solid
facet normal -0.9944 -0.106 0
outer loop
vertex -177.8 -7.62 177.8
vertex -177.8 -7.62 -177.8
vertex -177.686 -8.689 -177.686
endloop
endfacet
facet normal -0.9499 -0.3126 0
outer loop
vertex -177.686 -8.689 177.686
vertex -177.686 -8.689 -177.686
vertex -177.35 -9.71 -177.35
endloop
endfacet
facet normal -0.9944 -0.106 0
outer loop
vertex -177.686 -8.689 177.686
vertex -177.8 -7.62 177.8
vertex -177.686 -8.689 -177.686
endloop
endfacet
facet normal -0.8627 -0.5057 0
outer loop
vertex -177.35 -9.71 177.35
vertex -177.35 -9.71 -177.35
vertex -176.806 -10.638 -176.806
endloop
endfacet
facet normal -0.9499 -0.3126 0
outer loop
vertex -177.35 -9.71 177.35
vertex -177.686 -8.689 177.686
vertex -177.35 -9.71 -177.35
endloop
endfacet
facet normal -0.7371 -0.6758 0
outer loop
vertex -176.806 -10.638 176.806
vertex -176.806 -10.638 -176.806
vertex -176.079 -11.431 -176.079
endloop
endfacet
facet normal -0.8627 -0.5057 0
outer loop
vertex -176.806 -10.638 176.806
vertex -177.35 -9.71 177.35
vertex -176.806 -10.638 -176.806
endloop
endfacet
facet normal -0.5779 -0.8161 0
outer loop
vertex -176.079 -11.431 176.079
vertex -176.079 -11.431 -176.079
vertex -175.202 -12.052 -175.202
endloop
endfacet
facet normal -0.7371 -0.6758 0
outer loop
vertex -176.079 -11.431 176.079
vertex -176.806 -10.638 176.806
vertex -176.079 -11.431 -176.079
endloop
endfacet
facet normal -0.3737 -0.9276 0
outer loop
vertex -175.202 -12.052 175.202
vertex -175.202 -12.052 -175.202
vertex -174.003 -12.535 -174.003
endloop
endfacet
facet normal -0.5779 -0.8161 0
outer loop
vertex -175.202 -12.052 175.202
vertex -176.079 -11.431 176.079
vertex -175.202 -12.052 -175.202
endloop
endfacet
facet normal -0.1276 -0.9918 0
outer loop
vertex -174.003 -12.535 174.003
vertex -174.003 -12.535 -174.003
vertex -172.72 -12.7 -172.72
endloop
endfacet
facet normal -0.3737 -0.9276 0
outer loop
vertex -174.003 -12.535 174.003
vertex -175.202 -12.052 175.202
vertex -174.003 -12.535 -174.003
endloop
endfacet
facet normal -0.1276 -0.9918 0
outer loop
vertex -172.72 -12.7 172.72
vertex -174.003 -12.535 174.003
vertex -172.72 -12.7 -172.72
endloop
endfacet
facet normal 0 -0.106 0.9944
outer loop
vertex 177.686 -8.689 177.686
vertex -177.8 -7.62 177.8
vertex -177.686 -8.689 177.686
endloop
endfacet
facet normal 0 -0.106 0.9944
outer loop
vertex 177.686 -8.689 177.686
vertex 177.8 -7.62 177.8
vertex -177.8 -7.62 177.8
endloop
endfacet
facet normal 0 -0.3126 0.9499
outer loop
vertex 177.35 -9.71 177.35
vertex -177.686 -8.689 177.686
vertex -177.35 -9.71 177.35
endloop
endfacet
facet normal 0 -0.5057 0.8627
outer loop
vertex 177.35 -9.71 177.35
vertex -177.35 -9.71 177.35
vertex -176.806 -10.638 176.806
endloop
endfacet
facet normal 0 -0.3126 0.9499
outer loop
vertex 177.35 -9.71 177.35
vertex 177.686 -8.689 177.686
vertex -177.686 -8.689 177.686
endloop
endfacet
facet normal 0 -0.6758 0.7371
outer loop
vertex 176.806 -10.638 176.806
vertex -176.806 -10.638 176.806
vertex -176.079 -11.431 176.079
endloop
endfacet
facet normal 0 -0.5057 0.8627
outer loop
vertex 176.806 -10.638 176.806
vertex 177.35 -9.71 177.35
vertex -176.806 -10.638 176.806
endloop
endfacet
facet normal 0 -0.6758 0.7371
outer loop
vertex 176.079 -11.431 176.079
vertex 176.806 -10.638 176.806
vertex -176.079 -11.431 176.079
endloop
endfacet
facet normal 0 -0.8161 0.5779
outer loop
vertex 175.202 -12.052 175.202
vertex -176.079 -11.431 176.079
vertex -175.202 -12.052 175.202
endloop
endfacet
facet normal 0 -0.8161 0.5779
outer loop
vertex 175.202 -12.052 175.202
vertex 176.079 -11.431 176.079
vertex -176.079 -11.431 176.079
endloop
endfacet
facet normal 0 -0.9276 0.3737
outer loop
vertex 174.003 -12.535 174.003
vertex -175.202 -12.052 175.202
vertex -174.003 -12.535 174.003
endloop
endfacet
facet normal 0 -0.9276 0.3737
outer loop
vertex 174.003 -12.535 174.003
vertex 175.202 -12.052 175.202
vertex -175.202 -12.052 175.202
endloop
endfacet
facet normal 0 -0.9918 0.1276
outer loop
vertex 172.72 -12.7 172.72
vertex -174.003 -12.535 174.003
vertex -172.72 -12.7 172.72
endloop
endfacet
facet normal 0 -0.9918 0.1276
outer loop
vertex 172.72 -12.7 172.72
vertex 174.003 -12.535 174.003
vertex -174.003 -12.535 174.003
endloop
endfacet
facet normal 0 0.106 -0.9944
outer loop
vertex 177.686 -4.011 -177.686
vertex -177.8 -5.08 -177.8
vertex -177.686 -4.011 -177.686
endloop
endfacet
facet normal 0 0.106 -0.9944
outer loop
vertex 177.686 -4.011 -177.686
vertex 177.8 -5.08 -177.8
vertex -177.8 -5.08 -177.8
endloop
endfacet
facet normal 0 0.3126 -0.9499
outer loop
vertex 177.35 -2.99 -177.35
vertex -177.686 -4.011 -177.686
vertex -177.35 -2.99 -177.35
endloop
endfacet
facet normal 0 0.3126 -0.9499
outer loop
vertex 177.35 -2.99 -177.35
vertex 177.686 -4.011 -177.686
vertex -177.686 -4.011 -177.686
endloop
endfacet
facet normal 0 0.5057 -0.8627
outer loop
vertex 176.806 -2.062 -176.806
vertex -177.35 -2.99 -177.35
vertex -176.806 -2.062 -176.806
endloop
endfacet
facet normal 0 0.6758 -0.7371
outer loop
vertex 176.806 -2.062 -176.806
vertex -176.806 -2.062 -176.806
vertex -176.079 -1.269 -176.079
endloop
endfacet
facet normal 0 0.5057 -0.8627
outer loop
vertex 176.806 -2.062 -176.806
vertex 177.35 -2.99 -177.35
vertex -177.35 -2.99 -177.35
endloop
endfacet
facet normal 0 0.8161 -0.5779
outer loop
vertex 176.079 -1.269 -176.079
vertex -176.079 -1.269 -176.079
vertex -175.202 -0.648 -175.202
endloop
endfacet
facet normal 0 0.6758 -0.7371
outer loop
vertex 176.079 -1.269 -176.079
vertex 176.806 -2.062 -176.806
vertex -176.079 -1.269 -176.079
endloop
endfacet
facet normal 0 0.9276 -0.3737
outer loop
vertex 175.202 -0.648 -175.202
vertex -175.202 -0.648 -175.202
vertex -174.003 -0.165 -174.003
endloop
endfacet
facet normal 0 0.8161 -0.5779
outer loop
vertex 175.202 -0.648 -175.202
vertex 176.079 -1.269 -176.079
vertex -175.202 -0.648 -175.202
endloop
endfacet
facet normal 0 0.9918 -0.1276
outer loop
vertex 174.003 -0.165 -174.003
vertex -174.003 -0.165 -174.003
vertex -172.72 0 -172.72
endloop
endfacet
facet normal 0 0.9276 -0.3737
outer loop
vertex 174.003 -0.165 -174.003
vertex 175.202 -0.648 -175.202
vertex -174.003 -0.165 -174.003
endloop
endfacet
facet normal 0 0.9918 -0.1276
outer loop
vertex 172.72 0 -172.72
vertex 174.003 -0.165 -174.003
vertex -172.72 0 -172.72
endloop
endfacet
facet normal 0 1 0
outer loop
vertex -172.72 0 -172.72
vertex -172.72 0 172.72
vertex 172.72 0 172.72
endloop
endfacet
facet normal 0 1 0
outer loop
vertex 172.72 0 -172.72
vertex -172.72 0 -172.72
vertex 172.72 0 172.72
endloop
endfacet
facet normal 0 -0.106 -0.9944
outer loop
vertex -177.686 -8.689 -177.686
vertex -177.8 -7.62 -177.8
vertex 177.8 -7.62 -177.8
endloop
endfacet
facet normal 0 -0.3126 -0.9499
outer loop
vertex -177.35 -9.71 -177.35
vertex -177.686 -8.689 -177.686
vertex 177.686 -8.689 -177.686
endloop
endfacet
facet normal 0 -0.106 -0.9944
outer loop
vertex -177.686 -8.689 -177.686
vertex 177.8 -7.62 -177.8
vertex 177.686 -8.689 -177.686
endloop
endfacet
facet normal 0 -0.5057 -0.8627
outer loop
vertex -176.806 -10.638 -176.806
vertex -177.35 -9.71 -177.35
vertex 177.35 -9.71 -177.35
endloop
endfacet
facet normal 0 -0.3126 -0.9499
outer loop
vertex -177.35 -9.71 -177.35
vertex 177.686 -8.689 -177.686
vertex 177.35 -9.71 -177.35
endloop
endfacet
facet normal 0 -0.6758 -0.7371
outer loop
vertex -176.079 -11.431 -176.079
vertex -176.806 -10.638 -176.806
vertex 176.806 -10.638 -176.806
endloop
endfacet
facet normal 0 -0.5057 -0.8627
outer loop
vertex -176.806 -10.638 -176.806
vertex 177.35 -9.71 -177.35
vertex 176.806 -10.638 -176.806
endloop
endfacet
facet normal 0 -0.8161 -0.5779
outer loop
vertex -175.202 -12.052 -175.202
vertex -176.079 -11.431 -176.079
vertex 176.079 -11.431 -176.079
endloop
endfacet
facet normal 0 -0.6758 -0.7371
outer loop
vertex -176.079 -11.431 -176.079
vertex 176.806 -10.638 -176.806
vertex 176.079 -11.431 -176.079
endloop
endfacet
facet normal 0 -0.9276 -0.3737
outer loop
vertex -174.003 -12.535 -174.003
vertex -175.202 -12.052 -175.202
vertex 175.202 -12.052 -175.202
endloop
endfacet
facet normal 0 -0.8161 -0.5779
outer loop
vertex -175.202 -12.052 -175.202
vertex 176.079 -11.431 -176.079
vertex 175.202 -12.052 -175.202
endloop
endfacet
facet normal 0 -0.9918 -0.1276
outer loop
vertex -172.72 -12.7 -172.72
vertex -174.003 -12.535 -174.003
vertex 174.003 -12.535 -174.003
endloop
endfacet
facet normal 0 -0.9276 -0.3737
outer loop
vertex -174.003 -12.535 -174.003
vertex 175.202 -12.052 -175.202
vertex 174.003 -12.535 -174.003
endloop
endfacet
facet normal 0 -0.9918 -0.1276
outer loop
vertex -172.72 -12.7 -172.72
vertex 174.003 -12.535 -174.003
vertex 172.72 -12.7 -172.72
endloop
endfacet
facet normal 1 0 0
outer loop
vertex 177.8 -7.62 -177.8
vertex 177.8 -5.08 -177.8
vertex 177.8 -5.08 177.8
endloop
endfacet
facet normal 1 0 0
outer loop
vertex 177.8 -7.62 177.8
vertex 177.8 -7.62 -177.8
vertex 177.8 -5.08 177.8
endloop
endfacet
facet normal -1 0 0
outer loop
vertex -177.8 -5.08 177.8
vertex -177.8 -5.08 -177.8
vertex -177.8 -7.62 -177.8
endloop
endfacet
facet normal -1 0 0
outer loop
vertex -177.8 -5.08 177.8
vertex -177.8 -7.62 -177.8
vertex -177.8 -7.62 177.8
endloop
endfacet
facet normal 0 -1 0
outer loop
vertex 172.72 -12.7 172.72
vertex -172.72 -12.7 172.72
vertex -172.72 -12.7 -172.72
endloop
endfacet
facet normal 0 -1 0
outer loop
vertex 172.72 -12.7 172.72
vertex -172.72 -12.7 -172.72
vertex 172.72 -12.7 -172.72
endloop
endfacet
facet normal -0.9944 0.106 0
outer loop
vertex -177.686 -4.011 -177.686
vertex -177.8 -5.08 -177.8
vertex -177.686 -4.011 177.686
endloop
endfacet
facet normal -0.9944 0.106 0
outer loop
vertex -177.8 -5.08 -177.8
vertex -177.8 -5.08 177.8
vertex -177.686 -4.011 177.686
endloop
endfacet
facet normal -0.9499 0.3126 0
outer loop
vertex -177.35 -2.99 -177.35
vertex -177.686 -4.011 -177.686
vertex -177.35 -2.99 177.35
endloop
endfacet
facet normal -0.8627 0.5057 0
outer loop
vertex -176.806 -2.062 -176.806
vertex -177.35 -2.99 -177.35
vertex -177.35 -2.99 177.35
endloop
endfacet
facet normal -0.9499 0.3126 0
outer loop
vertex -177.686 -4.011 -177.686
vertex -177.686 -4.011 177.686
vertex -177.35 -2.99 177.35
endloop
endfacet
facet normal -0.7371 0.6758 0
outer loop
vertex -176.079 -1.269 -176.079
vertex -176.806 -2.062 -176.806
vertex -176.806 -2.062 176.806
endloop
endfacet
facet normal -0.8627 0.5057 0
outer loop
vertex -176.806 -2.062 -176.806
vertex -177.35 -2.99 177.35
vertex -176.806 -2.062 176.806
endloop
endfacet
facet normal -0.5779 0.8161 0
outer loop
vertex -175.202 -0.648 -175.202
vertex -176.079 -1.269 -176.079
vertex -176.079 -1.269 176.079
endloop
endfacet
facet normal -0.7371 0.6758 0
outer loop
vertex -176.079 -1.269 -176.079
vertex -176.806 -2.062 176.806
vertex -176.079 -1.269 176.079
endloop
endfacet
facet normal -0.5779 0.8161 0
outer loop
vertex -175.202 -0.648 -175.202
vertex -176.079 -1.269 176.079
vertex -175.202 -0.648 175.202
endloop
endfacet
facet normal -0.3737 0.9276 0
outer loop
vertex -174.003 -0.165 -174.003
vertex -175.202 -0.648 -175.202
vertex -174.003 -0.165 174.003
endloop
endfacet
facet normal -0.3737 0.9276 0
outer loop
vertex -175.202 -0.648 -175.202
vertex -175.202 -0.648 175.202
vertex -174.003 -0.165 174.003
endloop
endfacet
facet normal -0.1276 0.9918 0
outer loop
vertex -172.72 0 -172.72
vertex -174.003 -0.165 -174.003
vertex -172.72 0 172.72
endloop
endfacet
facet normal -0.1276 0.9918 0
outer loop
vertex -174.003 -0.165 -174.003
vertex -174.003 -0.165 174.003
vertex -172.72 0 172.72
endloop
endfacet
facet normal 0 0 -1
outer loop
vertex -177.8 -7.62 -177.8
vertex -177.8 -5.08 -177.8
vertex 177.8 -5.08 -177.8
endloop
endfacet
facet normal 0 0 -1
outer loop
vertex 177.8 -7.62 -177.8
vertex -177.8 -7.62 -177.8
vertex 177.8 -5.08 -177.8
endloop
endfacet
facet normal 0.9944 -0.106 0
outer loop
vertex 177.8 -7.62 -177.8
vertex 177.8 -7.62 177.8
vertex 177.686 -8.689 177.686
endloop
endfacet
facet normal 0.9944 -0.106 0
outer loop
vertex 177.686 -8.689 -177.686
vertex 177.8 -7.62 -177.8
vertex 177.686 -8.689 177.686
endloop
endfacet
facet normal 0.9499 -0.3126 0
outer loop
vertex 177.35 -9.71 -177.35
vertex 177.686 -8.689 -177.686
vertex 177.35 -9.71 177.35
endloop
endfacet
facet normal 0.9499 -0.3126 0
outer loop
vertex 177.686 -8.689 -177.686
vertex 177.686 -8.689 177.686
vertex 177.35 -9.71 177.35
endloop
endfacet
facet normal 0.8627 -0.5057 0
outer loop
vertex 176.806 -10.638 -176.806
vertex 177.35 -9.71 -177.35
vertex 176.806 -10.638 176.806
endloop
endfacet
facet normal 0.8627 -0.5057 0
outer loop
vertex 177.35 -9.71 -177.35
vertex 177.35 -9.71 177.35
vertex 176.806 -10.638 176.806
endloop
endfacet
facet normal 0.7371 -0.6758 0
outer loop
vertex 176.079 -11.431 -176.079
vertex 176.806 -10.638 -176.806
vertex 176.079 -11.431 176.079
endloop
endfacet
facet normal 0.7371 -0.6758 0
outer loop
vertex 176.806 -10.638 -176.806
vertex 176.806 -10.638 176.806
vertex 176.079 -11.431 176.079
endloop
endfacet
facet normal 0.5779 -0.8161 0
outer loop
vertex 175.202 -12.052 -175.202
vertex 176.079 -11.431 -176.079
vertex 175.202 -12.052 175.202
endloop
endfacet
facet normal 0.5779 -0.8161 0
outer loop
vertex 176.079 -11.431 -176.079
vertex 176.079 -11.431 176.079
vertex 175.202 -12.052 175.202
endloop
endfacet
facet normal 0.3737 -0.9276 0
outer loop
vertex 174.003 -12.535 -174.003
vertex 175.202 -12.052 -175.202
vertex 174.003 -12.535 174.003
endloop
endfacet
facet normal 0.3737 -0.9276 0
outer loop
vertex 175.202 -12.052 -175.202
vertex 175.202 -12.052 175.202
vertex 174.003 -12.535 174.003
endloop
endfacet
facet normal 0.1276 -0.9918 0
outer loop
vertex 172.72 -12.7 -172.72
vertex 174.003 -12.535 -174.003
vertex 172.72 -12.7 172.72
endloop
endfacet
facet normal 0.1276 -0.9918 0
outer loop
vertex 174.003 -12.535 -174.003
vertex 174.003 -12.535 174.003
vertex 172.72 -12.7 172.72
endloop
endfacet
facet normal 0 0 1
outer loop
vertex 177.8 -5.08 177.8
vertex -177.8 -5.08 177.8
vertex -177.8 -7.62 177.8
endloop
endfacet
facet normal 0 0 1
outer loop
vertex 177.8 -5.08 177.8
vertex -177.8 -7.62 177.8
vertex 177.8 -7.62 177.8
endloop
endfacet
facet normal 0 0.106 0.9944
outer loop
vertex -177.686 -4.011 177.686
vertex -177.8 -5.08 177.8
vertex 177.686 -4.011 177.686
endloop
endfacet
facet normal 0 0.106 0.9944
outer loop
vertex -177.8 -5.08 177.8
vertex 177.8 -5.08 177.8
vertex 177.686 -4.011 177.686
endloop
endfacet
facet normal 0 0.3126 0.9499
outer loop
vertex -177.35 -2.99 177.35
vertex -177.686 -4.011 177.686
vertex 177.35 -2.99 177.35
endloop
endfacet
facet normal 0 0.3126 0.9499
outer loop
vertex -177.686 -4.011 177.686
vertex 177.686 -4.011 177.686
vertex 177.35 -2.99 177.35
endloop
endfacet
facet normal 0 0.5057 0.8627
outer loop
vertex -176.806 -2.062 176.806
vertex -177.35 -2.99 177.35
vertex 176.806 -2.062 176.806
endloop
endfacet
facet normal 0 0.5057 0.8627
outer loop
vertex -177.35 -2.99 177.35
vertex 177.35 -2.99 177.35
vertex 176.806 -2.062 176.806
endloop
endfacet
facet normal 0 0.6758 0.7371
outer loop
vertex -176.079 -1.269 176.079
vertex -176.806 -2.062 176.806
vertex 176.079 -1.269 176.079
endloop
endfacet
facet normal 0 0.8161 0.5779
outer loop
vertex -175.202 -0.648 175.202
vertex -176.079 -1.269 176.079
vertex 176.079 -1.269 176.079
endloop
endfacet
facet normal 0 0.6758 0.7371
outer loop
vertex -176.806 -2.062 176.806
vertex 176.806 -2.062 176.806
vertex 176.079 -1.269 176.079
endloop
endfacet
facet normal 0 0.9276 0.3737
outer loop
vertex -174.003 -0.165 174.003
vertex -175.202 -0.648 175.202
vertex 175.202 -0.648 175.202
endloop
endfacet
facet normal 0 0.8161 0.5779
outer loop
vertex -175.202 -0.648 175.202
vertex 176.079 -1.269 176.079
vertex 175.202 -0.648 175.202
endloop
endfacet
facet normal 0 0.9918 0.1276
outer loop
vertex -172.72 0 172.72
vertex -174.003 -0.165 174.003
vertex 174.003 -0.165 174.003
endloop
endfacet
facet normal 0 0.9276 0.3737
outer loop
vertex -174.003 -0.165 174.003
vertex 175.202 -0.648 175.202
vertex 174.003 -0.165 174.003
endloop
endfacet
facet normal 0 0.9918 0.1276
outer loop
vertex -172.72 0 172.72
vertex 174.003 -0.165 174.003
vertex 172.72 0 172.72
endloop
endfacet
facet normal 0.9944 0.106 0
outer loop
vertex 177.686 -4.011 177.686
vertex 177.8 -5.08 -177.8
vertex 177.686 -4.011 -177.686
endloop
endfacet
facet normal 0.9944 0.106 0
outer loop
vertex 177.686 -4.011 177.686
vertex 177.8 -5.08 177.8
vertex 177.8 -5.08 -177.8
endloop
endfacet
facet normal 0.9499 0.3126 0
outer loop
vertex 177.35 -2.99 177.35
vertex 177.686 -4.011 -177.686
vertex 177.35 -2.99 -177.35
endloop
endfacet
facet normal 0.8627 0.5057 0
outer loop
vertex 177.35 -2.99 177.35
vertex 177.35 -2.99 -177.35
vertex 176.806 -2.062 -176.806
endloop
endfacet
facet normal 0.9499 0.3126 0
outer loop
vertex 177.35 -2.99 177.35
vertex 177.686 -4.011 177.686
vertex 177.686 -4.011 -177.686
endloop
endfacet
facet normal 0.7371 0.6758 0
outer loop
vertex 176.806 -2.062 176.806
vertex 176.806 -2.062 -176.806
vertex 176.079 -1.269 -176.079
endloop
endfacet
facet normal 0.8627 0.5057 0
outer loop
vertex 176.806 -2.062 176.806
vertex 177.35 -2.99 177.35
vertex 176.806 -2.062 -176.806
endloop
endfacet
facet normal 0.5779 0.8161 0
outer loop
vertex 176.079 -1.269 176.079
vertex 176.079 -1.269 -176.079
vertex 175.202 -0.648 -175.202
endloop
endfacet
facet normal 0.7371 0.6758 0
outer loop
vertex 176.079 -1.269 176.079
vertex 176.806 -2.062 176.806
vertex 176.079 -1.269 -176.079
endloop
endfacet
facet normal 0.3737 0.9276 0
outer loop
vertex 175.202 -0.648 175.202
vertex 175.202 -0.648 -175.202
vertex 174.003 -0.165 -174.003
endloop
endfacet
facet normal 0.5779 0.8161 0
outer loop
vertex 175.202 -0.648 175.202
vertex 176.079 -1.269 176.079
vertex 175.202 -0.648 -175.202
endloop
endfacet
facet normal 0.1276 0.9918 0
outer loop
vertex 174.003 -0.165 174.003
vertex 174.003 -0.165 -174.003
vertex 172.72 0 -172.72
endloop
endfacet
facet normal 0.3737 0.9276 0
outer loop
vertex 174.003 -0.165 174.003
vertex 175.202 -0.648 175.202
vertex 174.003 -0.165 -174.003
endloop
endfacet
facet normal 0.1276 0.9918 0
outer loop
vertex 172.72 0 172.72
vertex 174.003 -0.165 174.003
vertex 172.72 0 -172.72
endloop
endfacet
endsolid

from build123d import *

# Parameters (mm, degrees)
F0_W     = 355.6
F0_H     = 355.6
F1_DEPTH = 12.7
F2_R     = 5.08


with BuildPart() as f1:
    # F0 (on Front) → F1 (new body)
    with BuildSketch(Plane.XZ):
        Rectangle(F0_W, F0_H)
    extrude(amount=F1_DEPTH)

    # F2
    f2_edges = [f1.edges().sort_by_distance(p)[0] for p in [
        (177.8, -12.7, 0),
        (0, -12.7, 177.8),
        (-177.8, -12.7, 0),
        (0, -12.7, -177.8),
        (177.8, 0, 0),
        (0, 0, 177.8),
        (-177.8, 0, 0),
        (0, 0, -177.8),
    ]]
    fillet(f2_edges, radius=F2_R)


solid = f1.part
